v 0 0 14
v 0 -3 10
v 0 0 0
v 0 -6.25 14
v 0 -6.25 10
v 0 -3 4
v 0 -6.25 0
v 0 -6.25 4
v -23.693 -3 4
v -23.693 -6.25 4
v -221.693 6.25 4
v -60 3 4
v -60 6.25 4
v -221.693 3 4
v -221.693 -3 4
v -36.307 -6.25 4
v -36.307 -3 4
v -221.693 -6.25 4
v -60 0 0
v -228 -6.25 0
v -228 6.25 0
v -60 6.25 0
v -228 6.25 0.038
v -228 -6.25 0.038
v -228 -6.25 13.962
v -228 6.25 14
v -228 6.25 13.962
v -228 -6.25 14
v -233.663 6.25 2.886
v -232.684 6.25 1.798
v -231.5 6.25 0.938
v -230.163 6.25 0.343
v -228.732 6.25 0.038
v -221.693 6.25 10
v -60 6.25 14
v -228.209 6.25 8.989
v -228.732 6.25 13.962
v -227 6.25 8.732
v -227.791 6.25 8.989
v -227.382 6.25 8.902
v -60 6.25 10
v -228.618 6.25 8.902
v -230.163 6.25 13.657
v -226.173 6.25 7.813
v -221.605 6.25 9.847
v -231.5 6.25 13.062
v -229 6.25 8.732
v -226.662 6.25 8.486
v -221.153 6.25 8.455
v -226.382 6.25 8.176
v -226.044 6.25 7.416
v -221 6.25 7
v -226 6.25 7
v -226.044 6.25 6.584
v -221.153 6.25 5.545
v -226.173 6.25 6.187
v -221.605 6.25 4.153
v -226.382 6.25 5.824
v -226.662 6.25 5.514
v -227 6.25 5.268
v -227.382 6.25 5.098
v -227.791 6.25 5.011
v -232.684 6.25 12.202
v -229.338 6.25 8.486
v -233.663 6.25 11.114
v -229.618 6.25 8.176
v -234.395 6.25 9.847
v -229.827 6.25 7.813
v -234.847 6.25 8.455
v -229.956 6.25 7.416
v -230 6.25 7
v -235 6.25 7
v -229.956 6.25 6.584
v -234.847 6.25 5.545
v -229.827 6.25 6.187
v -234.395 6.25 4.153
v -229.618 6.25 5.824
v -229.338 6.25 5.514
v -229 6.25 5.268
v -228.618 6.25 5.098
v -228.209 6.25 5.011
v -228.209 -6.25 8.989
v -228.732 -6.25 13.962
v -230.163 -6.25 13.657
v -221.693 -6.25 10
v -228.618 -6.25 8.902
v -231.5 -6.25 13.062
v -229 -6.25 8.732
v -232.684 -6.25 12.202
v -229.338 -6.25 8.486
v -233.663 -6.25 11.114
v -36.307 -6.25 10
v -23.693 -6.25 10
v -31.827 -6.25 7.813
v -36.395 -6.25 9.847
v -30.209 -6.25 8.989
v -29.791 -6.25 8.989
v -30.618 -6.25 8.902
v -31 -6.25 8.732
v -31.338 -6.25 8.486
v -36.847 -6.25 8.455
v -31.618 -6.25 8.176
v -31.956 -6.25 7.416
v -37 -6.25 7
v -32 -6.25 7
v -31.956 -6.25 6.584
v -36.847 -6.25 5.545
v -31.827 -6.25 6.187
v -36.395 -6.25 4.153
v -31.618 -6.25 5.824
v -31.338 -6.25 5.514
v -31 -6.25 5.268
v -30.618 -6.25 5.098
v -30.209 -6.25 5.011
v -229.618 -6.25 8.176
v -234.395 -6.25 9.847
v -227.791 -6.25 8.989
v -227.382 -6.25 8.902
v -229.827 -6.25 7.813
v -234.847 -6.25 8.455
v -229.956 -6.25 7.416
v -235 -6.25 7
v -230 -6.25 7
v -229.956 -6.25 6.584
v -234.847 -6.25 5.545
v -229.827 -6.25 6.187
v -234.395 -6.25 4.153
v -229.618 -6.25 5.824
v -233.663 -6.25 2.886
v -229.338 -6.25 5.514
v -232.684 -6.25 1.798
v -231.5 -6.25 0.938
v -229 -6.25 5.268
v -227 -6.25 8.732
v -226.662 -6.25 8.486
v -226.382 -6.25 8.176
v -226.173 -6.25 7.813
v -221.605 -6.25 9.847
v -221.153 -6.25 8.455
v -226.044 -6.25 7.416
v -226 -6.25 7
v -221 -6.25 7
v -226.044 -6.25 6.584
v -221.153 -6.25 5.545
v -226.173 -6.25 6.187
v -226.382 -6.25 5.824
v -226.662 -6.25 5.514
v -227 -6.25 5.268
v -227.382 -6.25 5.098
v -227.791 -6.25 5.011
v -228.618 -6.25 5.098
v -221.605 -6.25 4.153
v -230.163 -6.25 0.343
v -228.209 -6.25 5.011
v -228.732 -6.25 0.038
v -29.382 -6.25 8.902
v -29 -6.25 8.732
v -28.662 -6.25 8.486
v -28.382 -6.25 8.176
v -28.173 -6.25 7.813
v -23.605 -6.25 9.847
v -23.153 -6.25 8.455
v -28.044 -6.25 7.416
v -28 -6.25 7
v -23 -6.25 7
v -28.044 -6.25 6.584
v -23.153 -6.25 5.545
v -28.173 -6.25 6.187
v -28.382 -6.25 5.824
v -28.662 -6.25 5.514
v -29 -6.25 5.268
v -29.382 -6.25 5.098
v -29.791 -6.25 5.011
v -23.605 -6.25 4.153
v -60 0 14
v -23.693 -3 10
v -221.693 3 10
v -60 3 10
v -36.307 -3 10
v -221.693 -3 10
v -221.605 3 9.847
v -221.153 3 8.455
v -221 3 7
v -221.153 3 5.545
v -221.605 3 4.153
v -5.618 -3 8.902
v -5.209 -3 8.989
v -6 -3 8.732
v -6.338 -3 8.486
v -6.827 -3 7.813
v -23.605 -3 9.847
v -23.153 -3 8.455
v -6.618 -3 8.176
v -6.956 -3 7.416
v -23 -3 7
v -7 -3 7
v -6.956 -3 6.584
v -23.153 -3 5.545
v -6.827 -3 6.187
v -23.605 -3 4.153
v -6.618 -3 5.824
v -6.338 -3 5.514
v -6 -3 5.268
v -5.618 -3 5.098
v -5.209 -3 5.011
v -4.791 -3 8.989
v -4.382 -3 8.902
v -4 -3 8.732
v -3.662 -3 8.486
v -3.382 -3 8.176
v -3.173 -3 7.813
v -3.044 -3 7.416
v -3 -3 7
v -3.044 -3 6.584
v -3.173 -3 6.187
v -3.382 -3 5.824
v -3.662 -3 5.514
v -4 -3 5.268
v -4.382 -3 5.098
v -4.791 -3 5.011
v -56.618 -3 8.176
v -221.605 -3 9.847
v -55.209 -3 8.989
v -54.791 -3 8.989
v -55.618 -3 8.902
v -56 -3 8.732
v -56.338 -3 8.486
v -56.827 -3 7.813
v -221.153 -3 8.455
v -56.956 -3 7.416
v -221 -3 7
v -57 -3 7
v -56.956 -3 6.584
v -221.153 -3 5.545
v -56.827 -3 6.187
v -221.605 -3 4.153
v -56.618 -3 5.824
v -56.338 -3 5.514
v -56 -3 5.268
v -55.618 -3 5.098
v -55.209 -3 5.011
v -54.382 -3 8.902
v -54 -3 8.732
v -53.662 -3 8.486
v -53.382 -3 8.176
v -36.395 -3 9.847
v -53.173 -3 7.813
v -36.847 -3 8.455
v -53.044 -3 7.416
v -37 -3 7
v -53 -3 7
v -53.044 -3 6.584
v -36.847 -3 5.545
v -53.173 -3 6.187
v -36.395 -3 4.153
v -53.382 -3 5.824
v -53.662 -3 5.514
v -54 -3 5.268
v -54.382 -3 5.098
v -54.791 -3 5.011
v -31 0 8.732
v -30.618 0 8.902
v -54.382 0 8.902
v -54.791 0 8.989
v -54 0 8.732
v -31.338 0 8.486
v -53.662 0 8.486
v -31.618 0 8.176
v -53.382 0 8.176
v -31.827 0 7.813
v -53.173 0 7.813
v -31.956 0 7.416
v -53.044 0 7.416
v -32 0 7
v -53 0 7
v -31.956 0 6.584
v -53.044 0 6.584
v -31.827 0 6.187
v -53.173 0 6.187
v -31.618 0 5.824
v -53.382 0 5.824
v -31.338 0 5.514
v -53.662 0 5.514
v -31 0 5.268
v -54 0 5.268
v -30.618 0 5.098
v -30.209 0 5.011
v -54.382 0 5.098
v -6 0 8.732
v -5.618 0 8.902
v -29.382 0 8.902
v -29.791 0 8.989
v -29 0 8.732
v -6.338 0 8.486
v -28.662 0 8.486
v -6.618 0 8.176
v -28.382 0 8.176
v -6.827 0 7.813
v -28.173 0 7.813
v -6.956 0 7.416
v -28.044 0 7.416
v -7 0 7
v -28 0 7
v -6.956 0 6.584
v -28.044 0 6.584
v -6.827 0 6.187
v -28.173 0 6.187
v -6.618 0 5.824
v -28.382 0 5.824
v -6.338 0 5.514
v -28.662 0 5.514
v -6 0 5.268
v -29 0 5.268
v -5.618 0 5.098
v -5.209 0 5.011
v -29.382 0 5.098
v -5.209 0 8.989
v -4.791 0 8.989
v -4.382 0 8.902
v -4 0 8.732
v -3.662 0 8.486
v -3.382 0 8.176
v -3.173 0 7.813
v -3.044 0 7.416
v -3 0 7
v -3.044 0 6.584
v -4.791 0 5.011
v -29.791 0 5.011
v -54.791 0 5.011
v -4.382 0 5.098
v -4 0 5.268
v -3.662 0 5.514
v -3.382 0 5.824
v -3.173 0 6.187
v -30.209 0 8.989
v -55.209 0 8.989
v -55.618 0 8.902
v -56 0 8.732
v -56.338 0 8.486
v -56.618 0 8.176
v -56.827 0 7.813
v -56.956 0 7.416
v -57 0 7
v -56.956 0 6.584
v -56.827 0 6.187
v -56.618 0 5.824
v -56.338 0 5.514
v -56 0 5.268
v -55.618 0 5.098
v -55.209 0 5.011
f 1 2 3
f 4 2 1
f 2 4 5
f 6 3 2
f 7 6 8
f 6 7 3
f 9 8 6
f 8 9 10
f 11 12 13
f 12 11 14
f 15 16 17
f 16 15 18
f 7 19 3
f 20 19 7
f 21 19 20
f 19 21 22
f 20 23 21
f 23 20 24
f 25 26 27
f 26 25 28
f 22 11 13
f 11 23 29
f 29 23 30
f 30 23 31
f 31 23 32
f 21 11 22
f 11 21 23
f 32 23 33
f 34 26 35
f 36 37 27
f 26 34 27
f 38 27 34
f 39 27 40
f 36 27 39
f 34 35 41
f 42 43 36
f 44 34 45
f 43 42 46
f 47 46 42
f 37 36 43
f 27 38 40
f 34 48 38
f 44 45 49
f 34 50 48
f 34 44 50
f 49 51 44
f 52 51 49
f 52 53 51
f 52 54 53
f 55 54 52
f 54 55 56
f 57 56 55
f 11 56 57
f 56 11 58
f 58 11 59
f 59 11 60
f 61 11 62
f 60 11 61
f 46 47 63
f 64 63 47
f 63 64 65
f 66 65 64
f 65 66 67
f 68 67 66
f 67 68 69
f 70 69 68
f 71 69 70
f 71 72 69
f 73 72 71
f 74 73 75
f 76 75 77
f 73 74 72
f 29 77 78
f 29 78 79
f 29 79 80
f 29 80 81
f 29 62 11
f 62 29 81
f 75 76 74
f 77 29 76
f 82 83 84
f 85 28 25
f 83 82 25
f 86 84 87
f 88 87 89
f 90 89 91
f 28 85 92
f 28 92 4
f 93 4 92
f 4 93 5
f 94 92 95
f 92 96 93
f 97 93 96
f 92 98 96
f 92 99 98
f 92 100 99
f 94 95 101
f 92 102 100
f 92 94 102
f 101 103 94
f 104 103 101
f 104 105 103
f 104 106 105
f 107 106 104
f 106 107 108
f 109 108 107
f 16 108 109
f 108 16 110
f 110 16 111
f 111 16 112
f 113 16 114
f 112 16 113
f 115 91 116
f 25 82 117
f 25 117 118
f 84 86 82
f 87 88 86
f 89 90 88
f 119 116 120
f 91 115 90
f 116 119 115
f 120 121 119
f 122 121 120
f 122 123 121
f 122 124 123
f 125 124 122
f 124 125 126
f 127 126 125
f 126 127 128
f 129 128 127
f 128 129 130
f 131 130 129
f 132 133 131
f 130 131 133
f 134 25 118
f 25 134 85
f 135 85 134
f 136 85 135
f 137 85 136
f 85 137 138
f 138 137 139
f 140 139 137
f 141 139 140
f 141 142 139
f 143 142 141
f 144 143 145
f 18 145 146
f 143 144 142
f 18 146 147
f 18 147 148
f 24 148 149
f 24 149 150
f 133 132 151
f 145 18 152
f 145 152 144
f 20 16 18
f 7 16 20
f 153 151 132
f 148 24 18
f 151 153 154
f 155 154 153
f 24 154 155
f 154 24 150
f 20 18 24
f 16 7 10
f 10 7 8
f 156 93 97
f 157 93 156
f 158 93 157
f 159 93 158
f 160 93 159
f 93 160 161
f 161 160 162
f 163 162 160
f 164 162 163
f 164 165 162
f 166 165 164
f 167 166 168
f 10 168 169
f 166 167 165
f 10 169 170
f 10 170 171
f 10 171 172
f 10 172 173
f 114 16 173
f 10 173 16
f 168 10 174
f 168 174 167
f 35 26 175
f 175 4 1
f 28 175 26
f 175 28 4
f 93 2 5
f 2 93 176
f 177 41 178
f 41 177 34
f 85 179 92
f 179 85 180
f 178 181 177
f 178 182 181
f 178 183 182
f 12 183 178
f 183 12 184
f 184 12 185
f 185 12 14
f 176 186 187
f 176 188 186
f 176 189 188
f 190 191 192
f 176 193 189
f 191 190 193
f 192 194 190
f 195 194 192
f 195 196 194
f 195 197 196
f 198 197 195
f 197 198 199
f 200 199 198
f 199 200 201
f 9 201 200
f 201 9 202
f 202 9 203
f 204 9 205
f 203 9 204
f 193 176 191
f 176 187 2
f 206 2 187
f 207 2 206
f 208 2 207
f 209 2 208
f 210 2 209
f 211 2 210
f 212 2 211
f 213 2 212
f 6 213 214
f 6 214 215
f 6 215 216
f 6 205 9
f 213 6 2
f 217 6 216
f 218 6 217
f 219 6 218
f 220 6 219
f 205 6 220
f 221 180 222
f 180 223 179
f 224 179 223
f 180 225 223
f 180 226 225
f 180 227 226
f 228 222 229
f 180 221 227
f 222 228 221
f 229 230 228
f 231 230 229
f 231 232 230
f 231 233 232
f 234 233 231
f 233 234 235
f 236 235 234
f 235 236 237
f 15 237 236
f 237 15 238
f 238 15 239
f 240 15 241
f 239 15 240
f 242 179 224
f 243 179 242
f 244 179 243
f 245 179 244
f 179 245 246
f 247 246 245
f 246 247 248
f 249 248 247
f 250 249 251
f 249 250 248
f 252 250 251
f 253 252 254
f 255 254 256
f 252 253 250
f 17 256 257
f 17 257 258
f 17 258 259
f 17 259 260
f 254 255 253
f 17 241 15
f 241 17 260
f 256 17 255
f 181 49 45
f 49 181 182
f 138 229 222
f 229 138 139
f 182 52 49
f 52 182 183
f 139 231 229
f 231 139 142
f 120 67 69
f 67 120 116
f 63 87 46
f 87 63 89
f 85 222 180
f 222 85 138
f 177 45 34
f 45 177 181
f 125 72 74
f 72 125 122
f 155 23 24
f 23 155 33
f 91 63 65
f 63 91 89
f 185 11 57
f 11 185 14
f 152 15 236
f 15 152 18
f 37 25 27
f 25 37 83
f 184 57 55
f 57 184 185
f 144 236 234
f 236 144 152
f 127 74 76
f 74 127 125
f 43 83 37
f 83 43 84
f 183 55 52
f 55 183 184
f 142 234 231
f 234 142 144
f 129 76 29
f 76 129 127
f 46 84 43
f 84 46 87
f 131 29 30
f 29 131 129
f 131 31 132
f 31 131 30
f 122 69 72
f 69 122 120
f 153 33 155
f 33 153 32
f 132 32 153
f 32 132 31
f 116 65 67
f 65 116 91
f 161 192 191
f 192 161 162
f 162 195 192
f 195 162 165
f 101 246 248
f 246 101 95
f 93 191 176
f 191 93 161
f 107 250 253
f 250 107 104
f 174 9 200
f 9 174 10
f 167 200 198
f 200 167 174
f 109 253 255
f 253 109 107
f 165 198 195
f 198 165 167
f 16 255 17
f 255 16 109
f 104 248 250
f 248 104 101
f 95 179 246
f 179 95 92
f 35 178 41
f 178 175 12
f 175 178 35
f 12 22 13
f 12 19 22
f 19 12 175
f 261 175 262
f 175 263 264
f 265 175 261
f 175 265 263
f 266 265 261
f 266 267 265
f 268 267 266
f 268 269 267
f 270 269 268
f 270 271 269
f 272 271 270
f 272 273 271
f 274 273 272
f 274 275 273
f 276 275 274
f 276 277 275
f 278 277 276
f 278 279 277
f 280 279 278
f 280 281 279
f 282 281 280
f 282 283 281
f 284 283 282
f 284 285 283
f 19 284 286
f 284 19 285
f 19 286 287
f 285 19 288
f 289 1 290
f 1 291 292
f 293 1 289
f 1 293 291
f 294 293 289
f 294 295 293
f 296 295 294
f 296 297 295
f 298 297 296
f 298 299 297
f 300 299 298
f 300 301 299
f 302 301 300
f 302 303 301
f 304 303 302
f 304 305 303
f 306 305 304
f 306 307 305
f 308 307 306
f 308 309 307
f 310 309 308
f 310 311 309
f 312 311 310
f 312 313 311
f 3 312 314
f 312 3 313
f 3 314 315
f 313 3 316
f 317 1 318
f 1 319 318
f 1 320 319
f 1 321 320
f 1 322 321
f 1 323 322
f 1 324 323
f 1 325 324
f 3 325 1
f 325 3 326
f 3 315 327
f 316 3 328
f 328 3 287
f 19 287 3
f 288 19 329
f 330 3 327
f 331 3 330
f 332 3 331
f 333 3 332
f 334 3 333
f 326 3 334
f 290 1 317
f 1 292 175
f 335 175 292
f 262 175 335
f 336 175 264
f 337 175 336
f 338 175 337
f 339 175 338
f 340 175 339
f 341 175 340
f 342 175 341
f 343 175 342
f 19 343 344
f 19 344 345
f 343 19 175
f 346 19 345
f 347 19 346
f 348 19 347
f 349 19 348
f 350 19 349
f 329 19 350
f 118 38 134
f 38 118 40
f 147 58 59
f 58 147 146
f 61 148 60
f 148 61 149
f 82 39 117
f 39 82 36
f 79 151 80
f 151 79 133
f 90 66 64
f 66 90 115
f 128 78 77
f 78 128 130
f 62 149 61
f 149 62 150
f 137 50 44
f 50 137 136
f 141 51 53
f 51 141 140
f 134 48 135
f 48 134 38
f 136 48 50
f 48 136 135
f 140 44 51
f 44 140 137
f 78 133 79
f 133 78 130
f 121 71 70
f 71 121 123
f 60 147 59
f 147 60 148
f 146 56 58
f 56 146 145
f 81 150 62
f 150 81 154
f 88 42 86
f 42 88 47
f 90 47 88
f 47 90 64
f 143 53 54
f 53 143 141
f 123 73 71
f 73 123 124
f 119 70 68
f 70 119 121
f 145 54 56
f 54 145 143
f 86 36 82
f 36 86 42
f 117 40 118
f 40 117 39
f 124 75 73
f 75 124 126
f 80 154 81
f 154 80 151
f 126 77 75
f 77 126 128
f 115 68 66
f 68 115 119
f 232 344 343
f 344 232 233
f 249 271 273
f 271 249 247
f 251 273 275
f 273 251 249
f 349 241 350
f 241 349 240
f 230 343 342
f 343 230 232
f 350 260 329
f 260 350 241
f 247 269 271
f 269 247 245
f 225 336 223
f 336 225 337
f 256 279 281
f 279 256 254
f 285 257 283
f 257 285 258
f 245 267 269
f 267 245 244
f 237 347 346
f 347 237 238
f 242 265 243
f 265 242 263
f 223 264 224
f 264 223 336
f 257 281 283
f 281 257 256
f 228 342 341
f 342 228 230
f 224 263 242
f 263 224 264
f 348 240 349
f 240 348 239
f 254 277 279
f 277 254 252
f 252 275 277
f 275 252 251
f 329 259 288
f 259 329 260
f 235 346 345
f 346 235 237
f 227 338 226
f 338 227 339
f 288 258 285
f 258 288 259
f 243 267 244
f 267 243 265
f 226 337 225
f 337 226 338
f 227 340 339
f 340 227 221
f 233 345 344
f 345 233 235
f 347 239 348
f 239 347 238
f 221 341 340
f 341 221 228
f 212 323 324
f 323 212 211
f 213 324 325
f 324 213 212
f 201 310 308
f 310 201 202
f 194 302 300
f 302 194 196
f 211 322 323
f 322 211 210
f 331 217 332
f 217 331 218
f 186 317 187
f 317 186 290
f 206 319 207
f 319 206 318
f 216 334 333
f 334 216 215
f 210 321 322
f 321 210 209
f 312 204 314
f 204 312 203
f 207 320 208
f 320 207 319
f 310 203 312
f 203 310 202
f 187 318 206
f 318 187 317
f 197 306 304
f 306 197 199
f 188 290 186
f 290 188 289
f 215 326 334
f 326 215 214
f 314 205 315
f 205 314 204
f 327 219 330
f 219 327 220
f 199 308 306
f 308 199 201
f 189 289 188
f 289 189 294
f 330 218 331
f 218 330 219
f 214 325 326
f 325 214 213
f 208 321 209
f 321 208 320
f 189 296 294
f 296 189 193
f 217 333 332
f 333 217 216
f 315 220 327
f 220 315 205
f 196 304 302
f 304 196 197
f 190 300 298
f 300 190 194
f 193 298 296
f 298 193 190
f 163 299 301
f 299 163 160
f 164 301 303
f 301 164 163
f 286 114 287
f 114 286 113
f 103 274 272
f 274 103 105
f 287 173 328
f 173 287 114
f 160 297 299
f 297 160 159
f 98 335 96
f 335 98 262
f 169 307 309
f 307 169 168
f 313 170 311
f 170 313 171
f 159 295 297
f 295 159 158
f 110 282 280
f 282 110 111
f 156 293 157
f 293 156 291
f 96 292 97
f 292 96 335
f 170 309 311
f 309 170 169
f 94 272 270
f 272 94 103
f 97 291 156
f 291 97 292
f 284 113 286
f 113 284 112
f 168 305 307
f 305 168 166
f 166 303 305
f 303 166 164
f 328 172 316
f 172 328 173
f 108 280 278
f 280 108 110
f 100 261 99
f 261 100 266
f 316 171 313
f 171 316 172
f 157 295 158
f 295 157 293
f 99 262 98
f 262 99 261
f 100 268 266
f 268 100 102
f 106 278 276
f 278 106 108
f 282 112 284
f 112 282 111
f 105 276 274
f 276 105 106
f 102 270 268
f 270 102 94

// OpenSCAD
/*
Robot scissor lift components for FTC Team #11587
16 inch Scissor Lift Arm
Kurt Kochendarfer
January 2017
*/

/*Scissor lift arm design in 2 pieces to allow printing on a 10" print bed 3D printer.*/

module makeLowerFlange() {
    translate([-114,0,0])
    color("black",0.75) {
        cube(size=[228,12.5,4],center=true);
    }
}

module makeUpperFlange() {
    translate([-114,0,10])
    color("black",0.75) {
        cube(size=[228,12.5,4],center=true);
    }
}

module makeWeb() {
    translate([-114,0,5])
    color("black",0.75) {
        cube(size=[228,6,10],center=true);
    }
}

module makeBeam() {
    makeLowerFlange();
    makeUpperFlange();
    makeWeb();
}

module makeEndHole() {
    translate([-228,0,5])
    color("blue",0.75) {
        rotate([90,0,0]) {  
            cylinder(h=14,d=4,center=true,$fn=30);
        }
    }
}

module makeRoundEnd() {
    translate([-228,0,5])
    color("black",0.75) {
        rotate([90,0,0]) {
            cylinder(h=12.5,d=14,center=true,$fn=30);
        }
    }
}

module makeConnectHole1() {
    translate([-55,0,5])
    color("blue",0.75) {
        rotate([90,0,0]) {  
            cylinder(h=14,d=4,center=true,$fn=30);
        }
    }
}

module makeConnectHole2() {
    translate([-5,0,5])
    color("blue",0.75) {
        rotate([90,0,0]) {  
            cylinder(h=14,d=4,center=true,$fn=30);
        }
    }
}

module makePivotHole() {
    translate([-30,0,5])
    color("blue",0.75) {
        rotate([90,0,0]) {  
            cylinder(h=14,d=4,center=true,$fn=30);
        }
    }
}

module makePivotReinforcement() {
    translate([-30,0,5])
    color("black",0.75) {
        rotate([90,0,0]) {
            cylinder(h=12.5,d=14,center=true,$fn=30);
        }
    }
}
    
module makeCutaway() {
    translate([-60,0,-3])
    color("yellow",0.75) {
        cube(size=[61,7,16]);
    }
}

module makeAllBeam() {
    makeBeam();
    makeRoundEnd();
    makePivotReinforcement();
}

module makeAllHoles() {
    makeEndHole();
    makeConnectHole1();
    makeConnectHole2();
    makePivotHole();
}

module makeOverlap() {
    difference() {
        makeAllBeam();
        makeCutaway();
    }
}

translate([0,0,2])
difference() {
    makeOverlap();
    makeAllHoles();
}
    
